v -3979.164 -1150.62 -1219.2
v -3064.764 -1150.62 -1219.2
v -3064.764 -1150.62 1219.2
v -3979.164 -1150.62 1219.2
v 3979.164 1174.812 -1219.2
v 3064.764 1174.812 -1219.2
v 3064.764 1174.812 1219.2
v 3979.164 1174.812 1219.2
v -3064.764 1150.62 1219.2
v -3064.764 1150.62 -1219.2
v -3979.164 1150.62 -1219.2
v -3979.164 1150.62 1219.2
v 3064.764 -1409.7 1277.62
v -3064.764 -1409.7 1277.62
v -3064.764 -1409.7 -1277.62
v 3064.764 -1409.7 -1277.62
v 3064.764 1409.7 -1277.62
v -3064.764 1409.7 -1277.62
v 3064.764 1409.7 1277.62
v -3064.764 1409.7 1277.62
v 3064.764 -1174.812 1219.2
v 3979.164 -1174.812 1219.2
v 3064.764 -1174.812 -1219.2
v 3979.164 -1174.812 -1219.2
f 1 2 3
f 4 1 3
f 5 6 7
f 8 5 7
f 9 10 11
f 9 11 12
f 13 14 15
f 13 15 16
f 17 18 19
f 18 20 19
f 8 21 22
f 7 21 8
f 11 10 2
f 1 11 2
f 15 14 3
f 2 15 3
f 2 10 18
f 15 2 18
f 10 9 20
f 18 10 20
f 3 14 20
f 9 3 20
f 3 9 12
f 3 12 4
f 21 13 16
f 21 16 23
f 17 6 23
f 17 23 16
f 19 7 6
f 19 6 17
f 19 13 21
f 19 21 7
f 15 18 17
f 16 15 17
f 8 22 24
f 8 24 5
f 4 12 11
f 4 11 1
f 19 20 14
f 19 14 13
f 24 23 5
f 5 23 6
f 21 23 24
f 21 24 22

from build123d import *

# Parameters (mm, degrees)
F0_W     = 6129.528
F0_H     = 2819.4
F1_DEPTH = 1277.62
F2_W     = 2349.624518
F2_H     = 2438.4
F3_DEPTH = 914.4
F4_W     = 2301.24
F4_H     = 2438.4
F5_DEPTH = 914.4


with BuildPart() as f1:
    # F0 (on Top) → F1 (new body, symmetric)
    with BuildSketch(Plane.XY):
        Rectangle(F0_W, F0_H)
    extrude(amount=F1_DEPTH, both=True)

    # F2 (on face) → F3 (join)
    with BuildSketch(Plane.YZ.offset(3064.764)):
        Rectangle(F2_W, F2_H)
    extrude(amount=F3_DEPTH)

    # F4 (on face) → F5 (join)
    with BuildSketch(Plane(origin=(-3064.764, 0, 0), x_dir=(0, -1, 0), z_dir=(-1, 0, 0))):
        Rectangle(F4_W, F4_H)
    extrude(amount=F5_DEPTH)


solid = f1.part
